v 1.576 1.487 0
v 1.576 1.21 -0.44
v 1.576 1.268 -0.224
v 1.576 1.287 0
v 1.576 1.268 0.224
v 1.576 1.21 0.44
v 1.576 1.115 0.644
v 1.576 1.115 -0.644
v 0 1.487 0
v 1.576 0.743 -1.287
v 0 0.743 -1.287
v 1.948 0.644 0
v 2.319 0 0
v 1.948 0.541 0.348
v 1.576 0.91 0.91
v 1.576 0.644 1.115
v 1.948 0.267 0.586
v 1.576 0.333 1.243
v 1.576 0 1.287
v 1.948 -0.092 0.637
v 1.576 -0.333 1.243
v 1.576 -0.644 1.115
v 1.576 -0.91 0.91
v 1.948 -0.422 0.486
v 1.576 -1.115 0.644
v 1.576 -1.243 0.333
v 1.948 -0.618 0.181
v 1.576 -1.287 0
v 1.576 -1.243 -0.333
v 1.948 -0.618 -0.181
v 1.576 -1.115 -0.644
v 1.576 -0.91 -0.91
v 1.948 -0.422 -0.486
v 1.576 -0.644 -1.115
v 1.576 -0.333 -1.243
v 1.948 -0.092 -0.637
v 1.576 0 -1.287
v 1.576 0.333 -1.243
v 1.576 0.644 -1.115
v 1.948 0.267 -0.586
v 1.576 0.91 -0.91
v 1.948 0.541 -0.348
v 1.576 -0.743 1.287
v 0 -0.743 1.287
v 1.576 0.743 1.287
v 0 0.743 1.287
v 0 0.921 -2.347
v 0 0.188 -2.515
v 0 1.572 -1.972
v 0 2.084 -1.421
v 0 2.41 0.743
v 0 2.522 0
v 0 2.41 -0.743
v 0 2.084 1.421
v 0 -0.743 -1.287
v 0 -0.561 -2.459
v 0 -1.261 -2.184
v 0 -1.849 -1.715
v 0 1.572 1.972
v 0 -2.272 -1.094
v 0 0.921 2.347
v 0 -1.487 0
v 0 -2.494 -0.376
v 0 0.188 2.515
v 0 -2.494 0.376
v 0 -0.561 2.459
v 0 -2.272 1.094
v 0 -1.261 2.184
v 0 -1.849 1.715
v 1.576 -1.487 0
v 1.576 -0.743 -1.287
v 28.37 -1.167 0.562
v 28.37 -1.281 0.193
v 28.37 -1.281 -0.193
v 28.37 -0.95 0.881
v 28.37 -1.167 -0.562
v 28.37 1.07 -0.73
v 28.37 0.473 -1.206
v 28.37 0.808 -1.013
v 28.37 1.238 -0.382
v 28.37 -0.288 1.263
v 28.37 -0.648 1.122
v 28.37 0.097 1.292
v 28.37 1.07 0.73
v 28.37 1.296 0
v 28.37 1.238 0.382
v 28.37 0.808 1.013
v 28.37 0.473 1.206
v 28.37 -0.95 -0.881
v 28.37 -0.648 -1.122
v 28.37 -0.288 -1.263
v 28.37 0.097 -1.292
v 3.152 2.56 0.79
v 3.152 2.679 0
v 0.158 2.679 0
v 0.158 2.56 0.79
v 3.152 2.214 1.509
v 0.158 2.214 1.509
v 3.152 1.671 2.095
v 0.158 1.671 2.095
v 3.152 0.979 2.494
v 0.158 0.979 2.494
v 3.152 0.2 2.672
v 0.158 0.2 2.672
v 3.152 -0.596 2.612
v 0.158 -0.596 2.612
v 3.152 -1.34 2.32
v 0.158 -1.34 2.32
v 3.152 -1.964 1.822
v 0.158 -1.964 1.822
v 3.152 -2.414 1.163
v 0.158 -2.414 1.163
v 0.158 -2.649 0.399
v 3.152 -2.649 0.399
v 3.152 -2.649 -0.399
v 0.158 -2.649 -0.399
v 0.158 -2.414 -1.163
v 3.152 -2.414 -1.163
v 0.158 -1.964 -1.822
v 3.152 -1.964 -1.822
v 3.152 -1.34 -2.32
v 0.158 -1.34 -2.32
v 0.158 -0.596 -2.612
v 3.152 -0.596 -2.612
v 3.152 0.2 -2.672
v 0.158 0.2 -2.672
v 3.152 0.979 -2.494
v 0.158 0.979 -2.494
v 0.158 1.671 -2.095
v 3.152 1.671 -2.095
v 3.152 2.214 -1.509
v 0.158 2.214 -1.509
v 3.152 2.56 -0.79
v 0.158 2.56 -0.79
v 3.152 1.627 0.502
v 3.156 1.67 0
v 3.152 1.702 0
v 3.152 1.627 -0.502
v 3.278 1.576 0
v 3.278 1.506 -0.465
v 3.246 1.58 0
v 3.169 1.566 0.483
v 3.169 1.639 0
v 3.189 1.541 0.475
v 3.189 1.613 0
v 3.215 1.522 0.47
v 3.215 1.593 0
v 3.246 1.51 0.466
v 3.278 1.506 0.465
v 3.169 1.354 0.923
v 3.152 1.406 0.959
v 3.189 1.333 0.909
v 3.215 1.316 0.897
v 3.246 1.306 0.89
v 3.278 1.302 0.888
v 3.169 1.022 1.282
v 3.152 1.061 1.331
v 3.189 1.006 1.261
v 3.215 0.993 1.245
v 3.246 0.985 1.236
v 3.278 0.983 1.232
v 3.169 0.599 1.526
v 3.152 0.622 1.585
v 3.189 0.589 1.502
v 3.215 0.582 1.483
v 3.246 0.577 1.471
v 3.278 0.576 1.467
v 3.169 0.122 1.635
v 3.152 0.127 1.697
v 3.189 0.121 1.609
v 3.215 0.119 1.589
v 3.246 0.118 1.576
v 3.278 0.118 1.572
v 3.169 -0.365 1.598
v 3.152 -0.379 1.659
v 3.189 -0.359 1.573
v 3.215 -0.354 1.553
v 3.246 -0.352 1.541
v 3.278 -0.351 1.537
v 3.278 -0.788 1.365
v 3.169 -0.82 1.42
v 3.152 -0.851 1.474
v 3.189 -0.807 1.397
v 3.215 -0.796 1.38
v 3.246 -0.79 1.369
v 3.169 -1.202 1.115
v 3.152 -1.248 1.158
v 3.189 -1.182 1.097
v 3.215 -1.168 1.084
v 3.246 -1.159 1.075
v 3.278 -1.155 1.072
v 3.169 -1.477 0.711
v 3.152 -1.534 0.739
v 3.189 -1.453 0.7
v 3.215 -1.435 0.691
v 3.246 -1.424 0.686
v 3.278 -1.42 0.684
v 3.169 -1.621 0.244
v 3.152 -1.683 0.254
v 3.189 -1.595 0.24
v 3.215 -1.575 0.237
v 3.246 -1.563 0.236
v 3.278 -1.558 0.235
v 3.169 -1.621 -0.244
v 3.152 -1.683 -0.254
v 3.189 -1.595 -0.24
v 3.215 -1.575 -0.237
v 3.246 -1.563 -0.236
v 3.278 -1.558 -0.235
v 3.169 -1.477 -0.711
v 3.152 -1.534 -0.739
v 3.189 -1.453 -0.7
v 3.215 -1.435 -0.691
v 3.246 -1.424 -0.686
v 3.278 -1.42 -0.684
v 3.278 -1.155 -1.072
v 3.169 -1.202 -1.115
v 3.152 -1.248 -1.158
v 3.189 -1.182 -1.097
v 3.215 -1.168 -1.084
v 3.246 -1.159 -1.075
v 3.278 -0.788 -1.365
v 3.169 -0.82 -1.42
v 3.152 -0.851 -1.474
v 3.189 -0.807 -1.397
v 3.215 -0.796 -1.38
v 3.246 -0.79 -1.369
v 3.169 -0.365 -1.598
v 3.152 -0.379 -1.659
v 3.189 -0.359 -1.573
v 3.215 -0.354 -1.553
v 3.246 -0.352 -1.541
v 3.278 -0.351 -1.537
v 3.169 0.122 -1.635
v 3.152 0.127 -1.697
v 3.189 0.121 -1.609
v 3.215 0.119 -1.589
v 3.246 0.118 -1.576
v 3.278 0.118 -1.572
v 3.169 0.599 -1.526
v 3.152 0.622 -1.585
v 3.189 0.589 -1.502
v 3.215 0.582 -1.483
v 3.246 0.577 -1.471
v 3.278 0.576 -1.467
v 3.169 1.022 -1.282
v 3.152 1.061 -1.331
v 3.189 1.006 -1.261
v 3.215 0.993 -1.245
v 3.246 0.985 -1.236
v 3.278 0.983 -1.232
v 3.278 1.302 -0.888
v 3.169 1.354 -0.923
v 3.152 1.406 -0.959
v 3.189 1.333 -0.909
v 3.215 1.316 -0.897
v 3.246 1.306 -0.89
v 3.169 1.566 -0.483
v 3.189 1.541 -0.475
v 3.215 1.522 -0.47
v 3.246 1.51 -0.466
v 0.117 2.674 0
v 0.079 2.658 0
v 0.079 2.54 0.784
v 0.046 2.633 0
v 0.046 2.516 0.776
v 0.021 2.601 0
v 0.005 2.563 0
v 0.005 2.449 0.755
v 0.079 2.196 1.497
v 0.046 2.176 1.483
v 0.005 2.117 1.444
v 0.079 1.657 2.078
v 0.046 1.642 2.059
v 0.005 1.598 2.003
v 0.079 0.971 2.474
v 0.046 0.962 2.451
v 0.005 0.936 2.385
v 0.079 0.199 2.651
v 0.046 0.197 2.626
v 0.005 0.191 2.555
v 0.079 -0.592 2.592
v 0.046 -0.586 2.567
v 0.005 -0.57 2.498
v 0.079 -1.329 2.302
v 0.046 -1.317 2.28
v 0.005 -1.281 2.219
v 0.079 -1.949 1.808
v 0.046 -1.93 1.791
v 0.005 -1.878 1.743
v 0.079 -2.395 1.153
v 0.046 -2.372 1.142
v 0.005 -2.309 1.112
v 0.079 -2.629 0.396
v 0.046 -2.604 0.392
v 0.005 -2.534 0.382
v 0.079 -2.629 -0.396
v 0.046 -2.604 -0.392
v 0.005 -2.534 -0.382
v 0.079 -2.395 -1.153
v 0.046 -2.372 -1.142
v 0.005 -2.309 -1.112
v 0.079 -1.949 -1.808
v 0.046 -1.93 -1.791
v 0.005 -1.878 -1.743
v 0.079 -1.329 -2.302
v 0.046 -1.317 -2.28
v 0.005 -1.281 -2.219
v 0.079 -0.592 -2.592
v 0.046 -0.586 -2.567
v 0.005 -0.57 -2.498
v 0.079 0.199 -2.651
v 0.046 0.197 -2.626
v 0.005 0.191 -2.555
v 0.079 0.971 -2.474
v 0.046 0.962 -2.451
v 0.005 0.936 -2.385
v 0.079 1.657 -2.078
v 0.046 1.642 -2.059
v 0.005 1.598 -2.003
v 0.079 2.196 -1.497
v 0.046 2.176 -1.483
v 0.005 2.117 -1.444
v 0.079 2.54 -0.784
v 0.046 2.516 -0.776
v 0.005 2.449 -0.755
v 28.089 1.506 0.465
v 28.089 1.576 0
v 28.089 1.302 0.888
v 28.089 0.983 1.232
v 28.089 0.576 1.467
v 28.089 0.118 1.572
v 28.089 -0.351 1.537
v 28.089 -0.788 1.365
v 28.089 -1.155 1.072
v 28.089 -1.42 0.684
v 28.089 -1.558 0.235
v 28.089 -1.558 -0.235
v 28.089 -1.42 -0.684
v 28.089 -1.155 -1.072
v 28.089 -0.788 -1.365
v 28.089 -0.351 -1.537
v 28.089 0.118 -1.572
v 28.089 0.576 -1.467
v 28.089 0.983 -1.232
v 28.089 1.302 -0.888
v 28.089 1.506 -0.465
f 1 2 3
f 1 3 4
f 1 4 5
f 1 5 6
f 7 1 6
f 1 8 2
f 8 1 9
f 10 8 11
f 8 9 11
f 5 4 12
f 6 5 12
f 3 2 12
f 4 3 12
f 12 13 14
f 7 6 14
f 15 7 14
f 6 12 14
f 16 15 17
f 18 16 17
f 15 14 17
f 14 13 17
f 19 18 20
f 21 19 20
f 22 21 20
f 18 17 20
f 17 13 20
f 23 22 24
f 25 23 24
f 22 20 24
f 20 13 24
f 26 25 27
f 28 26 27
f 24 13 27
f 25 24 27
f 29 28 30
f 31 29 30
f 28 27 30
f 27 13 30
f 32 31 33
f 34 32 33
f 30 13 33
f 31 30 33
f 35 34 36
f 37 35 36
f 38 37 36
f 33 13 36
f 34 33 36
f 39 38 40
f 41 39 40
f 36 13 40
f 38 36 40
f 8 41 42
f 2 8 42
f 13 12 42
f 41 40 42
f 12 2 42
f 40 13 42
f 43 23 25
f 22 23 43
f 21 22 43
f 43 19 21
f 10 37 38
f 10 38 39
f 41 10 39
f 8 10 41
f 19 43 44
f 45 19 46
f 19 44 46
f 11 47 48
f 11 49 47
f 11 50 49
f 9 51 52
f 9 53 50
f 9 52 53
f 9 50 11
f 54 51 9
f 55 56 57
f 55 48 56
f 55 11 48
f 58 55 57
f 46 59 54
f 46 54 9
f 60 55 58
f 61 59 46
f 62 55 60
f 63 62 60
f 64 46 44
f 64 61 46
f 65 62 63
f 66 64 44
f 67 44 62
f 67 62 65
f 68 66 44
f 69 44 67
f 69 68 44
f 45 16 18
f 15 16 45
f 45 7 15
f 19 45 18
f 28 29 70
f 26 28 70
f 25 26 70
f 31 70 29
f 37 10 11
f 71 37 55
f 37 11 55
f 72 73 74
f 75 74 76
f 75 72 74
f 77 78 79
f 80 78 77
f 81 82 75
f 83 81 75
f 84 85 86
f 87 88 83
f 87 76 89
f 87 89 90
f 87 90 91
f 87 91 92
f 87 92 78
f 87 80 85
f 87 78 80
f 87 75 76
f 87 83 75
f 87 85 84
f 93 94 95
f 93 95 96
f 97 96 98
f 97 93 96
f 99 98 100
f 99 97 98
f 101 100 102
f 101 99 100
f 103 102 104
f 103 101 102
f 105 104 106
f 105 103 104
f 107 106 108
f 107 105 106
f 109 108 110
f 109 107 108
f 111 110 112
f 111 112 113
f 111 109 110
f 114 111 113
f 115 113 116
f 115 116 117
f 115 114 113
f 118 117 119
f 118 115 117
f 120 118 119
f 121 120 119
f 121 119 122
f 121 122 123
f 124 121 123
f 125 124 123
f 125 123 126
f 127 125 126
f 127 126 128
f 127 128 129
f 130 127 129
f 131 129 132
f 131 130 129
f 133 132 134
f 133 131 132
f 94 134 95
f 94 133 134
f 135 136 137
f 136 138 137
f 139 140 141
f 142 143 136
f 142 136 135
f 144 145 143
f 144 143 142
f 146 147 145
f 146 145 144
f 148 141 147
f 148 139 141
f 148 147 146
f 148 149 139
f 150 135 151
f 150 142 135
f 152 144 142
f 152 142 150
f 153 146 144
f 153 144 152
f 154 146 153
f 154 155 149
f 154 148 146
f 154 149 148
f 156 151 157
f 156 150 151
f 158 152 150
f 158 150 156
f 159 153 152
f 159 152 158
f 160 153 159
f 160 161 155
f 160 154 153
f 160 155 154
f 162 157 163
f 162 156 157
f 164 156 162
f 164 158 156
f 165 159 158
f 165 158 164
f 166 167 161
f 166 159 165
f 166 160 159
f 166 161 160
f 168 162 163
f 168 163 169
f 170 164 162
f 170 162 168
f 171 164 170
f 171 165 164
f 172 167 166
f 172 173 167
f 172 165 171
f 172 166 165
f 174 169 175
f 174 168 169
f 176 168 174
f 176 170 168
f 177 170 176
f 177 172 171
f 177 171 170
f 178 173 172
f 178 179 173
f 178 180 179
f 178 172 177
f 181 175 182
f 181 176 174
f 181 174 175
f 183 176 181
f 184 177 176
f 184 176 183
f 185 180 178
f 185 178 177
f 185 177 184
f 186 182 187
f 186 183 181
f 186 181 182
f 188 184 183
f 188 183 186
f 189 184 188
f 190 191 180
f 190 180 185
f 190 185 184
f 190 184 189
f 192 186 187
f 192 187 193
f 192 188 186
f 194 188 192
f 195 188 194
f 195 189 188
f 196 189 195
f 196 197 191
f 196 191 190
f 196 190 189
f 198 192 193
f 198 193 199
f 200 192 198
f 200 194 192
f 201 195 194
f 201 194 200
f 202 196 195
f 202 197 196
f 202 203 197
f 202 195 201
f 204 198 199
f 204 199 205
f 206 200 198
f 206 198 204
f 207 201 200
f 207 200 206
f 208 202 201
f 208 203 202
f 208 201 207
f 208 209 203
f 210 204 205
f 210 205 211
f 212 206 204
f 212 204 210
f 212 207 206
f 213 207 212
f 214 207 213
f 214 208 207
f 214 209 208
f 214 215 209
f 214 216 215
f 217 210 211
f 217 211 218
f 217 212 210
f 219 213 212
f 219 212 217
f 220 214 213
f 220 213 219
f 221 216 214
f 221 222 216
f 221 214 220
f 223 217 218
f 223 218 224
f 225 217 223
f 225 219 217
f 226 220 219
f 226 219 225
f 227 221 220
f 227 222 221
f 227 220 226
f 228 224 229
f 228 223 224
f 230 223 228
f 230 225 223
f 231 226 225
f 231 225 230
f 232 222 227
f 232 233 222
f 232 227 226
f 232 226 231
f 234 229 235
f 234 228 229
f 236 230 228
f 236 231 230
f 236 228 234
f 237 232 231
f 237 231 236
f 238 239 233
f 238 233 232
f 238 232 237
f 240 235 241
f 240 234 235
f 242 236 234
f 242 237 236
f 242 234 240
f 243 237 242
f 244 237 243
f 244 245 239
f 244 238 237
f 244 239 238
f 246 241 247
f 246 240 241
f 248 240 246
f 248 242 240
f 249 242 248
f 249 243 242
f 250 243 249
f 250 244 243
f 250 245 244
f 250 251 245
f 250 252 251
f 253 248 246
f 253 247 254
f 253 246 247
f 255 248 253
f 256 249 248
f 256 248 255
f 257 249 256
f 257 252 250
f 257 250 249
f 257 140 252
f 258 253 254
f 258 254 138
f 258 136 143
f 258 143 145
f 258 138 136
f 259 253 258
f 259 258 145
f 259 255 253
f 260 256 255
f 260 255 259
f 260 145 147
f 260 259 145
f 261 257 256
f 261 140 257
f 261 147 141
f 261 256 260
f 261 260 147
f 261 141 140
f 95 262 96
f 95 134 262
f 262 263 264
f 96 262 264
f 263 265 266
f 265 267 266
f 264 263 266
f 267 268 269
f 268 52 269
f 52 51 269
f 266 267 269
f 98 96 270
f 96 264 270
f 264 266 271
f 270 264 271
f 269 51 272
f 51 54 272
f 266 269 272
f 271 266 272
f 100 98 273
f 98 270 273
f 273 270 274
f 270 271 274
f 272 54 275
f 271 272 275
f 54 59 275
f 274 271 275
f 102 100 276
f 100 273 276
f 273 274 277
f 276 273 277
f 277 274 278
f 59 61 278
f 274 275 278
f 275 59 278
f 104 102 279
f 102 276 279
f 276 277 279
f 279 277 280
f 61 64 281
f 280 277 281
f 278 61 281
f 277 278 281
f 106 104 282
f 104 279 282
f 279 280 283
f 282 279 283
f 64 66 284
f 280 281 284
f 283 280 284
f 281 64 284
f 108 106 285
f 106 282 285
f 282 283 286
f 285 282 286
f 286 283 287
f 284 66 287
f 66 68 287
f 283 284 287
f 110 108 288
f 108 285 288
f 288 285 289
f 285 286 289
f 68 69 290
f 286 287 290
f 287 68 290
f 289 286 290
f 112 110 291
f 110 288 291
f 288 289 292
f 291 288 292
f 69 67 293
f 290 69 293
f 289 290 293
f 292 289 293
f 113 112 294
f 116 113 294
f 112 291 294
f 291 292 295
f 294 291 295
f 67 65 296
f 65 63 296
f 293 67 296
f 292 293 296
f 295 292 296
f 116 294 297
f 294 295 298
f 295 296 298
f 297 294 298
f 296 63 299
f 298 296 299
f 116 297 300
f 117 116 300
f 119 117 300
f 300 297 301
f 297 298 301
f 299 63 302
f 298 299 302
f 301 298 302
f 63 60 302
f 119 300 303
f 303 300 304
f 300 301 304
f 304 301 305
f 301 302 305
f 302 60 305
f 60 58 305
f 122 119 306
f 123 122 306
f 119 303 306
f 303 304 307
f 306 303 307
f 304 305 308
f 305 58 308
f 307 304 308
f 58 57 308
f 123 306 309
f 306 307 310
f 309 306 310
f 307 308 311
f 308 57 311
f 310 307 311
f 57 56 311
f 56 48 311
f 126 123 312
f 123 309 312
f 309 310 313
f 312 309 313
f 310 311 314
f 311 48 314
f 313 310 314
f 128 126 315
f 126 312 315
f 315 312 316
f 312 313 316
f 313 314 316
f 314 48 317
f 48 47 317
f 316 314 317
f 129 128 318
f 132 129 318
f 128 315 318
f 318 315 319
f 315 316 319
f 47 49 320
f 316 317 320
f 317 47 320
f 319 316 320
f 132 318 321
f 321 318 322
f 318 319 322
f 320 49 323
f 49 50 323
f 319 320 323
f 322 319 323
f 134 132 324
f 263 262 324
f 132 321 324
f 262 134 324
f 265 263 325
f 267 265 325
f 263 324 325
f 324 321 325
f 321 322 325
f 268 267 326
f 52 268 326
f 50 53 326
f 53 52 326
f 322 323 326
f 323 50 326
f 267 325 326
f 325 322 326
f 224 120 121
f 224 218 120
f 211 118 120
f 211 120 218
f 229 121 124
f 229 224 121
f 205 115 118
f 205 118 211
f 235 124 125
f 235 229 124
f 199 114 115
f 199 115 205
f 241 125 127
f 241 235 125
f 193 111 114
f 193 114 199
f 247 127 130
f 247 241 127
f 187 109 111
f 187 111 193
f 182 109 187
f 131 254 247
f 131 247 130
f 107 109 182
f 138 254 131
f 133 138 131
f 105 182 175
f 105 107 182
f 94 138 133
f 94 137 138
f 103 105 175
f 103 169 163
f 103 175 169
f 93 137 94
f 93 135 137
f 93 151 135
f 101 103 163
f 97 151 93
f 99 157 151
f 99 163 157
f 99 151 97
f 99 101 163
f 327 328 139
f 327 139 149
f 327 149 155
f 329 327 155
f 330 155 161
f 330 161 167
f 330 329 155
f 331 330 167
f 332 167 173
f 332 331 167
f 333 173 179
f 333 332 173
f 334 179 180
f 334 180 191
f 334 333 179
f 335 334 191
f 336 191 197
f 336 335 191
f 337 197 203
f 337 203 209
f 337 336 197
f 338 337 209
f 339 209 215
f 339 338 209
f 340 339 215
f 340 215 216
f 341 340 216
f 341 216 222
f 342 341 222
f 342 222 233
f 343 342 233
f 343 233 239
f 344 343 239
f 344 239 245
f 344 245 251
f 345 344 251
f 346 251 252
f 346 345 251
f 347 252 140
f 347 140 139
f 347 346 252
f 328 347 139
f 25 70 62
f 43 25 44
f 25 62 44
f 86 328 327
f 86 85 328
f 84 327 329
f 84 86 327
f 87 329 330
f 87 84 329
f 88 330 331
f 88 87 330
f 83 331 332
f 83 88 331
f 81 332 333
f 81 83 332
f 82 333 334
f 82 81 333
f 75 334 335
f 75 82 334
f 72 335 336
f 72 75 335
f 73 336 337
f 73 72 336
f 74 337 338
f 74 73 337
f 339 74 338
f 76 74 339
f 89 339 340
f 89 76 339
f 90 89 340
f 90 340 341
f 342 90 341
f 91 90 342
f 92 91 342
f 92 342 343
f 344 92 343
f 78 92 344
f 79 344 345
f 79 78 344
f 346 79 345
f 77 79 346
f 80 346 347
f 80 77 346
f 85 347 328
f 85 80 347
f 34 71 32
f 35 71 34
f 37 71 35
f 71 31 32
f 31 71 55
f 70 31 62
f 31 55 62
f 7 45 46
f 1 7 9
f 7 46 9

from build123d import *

# Parameters (mm, degrees)
FILLET1_R    = 0.2
FILLET2_R    = 0.25
HEX_2_DEPTH  = 2.5
SCALE1_SCALE = 0.630434783


with BuildPart() as part:
    # BodySke → Base-Revolve (revolve)
    with BuildSketch(Plane.XY):
        Polygon((0, 0), (0, 4.25), (5, 4.25), (5, 2.5), (44.555, 2.5), (45, 2.055), (45, 0), align=None)
    revolve(axis=Axis((-31.75, 0, 0), (1, 0, 0)))

    # Fillet1
    fillet1_edges = [part.edges().sort_by_distance(p)[0] for p in [
        (5, -2.5, 0),
    ]]
    fillet(fillet1_edges, radius=FILLET1_R)

    # Fillet2
    fillet2_edges = [part.edges().sort_by_distance(p)[0] for p in [
        (0, -4.25, 0),
    ]]
    fillet(fillet2_edges, radius=FILLET2_R)

    # Sketch2 → Hex-PreBroach (revolve, cut)
    with BuildSketch(Plane.XY):
        Polygon((0, 2.042), (2.5, 2.042), (3.67894925, 0), (0, 0), align=None)
    revolve(axis=Axis((0, 0, 0), (1, 0, 0)), mode=Mode.SUBTRACT)

    # Sketch3 → Hex 2 (cut)
    with BuildSketch(Plane(origin=(0, 0, 0), x_dir=(0, 0.5, 0.866025404), z_dir=(-1, 0, 0))):
        Polygon((1.17894925, 2.042), (-1.17894925, 2.042), (-2.357898499, 0), (-1.17894925, -2.042), (1.17894925, -2.042), (2.357898499, 0), align=None)
    extrude(amount=-HEX_2_DEPTH, mode=Mode.SUBTRACT)


with BuildPart() as part_1:
    # Scale1: scaled about (0, 0, 0)
    add(part.part.scale(SCALE1_SCALE))


solid = part_1.part
